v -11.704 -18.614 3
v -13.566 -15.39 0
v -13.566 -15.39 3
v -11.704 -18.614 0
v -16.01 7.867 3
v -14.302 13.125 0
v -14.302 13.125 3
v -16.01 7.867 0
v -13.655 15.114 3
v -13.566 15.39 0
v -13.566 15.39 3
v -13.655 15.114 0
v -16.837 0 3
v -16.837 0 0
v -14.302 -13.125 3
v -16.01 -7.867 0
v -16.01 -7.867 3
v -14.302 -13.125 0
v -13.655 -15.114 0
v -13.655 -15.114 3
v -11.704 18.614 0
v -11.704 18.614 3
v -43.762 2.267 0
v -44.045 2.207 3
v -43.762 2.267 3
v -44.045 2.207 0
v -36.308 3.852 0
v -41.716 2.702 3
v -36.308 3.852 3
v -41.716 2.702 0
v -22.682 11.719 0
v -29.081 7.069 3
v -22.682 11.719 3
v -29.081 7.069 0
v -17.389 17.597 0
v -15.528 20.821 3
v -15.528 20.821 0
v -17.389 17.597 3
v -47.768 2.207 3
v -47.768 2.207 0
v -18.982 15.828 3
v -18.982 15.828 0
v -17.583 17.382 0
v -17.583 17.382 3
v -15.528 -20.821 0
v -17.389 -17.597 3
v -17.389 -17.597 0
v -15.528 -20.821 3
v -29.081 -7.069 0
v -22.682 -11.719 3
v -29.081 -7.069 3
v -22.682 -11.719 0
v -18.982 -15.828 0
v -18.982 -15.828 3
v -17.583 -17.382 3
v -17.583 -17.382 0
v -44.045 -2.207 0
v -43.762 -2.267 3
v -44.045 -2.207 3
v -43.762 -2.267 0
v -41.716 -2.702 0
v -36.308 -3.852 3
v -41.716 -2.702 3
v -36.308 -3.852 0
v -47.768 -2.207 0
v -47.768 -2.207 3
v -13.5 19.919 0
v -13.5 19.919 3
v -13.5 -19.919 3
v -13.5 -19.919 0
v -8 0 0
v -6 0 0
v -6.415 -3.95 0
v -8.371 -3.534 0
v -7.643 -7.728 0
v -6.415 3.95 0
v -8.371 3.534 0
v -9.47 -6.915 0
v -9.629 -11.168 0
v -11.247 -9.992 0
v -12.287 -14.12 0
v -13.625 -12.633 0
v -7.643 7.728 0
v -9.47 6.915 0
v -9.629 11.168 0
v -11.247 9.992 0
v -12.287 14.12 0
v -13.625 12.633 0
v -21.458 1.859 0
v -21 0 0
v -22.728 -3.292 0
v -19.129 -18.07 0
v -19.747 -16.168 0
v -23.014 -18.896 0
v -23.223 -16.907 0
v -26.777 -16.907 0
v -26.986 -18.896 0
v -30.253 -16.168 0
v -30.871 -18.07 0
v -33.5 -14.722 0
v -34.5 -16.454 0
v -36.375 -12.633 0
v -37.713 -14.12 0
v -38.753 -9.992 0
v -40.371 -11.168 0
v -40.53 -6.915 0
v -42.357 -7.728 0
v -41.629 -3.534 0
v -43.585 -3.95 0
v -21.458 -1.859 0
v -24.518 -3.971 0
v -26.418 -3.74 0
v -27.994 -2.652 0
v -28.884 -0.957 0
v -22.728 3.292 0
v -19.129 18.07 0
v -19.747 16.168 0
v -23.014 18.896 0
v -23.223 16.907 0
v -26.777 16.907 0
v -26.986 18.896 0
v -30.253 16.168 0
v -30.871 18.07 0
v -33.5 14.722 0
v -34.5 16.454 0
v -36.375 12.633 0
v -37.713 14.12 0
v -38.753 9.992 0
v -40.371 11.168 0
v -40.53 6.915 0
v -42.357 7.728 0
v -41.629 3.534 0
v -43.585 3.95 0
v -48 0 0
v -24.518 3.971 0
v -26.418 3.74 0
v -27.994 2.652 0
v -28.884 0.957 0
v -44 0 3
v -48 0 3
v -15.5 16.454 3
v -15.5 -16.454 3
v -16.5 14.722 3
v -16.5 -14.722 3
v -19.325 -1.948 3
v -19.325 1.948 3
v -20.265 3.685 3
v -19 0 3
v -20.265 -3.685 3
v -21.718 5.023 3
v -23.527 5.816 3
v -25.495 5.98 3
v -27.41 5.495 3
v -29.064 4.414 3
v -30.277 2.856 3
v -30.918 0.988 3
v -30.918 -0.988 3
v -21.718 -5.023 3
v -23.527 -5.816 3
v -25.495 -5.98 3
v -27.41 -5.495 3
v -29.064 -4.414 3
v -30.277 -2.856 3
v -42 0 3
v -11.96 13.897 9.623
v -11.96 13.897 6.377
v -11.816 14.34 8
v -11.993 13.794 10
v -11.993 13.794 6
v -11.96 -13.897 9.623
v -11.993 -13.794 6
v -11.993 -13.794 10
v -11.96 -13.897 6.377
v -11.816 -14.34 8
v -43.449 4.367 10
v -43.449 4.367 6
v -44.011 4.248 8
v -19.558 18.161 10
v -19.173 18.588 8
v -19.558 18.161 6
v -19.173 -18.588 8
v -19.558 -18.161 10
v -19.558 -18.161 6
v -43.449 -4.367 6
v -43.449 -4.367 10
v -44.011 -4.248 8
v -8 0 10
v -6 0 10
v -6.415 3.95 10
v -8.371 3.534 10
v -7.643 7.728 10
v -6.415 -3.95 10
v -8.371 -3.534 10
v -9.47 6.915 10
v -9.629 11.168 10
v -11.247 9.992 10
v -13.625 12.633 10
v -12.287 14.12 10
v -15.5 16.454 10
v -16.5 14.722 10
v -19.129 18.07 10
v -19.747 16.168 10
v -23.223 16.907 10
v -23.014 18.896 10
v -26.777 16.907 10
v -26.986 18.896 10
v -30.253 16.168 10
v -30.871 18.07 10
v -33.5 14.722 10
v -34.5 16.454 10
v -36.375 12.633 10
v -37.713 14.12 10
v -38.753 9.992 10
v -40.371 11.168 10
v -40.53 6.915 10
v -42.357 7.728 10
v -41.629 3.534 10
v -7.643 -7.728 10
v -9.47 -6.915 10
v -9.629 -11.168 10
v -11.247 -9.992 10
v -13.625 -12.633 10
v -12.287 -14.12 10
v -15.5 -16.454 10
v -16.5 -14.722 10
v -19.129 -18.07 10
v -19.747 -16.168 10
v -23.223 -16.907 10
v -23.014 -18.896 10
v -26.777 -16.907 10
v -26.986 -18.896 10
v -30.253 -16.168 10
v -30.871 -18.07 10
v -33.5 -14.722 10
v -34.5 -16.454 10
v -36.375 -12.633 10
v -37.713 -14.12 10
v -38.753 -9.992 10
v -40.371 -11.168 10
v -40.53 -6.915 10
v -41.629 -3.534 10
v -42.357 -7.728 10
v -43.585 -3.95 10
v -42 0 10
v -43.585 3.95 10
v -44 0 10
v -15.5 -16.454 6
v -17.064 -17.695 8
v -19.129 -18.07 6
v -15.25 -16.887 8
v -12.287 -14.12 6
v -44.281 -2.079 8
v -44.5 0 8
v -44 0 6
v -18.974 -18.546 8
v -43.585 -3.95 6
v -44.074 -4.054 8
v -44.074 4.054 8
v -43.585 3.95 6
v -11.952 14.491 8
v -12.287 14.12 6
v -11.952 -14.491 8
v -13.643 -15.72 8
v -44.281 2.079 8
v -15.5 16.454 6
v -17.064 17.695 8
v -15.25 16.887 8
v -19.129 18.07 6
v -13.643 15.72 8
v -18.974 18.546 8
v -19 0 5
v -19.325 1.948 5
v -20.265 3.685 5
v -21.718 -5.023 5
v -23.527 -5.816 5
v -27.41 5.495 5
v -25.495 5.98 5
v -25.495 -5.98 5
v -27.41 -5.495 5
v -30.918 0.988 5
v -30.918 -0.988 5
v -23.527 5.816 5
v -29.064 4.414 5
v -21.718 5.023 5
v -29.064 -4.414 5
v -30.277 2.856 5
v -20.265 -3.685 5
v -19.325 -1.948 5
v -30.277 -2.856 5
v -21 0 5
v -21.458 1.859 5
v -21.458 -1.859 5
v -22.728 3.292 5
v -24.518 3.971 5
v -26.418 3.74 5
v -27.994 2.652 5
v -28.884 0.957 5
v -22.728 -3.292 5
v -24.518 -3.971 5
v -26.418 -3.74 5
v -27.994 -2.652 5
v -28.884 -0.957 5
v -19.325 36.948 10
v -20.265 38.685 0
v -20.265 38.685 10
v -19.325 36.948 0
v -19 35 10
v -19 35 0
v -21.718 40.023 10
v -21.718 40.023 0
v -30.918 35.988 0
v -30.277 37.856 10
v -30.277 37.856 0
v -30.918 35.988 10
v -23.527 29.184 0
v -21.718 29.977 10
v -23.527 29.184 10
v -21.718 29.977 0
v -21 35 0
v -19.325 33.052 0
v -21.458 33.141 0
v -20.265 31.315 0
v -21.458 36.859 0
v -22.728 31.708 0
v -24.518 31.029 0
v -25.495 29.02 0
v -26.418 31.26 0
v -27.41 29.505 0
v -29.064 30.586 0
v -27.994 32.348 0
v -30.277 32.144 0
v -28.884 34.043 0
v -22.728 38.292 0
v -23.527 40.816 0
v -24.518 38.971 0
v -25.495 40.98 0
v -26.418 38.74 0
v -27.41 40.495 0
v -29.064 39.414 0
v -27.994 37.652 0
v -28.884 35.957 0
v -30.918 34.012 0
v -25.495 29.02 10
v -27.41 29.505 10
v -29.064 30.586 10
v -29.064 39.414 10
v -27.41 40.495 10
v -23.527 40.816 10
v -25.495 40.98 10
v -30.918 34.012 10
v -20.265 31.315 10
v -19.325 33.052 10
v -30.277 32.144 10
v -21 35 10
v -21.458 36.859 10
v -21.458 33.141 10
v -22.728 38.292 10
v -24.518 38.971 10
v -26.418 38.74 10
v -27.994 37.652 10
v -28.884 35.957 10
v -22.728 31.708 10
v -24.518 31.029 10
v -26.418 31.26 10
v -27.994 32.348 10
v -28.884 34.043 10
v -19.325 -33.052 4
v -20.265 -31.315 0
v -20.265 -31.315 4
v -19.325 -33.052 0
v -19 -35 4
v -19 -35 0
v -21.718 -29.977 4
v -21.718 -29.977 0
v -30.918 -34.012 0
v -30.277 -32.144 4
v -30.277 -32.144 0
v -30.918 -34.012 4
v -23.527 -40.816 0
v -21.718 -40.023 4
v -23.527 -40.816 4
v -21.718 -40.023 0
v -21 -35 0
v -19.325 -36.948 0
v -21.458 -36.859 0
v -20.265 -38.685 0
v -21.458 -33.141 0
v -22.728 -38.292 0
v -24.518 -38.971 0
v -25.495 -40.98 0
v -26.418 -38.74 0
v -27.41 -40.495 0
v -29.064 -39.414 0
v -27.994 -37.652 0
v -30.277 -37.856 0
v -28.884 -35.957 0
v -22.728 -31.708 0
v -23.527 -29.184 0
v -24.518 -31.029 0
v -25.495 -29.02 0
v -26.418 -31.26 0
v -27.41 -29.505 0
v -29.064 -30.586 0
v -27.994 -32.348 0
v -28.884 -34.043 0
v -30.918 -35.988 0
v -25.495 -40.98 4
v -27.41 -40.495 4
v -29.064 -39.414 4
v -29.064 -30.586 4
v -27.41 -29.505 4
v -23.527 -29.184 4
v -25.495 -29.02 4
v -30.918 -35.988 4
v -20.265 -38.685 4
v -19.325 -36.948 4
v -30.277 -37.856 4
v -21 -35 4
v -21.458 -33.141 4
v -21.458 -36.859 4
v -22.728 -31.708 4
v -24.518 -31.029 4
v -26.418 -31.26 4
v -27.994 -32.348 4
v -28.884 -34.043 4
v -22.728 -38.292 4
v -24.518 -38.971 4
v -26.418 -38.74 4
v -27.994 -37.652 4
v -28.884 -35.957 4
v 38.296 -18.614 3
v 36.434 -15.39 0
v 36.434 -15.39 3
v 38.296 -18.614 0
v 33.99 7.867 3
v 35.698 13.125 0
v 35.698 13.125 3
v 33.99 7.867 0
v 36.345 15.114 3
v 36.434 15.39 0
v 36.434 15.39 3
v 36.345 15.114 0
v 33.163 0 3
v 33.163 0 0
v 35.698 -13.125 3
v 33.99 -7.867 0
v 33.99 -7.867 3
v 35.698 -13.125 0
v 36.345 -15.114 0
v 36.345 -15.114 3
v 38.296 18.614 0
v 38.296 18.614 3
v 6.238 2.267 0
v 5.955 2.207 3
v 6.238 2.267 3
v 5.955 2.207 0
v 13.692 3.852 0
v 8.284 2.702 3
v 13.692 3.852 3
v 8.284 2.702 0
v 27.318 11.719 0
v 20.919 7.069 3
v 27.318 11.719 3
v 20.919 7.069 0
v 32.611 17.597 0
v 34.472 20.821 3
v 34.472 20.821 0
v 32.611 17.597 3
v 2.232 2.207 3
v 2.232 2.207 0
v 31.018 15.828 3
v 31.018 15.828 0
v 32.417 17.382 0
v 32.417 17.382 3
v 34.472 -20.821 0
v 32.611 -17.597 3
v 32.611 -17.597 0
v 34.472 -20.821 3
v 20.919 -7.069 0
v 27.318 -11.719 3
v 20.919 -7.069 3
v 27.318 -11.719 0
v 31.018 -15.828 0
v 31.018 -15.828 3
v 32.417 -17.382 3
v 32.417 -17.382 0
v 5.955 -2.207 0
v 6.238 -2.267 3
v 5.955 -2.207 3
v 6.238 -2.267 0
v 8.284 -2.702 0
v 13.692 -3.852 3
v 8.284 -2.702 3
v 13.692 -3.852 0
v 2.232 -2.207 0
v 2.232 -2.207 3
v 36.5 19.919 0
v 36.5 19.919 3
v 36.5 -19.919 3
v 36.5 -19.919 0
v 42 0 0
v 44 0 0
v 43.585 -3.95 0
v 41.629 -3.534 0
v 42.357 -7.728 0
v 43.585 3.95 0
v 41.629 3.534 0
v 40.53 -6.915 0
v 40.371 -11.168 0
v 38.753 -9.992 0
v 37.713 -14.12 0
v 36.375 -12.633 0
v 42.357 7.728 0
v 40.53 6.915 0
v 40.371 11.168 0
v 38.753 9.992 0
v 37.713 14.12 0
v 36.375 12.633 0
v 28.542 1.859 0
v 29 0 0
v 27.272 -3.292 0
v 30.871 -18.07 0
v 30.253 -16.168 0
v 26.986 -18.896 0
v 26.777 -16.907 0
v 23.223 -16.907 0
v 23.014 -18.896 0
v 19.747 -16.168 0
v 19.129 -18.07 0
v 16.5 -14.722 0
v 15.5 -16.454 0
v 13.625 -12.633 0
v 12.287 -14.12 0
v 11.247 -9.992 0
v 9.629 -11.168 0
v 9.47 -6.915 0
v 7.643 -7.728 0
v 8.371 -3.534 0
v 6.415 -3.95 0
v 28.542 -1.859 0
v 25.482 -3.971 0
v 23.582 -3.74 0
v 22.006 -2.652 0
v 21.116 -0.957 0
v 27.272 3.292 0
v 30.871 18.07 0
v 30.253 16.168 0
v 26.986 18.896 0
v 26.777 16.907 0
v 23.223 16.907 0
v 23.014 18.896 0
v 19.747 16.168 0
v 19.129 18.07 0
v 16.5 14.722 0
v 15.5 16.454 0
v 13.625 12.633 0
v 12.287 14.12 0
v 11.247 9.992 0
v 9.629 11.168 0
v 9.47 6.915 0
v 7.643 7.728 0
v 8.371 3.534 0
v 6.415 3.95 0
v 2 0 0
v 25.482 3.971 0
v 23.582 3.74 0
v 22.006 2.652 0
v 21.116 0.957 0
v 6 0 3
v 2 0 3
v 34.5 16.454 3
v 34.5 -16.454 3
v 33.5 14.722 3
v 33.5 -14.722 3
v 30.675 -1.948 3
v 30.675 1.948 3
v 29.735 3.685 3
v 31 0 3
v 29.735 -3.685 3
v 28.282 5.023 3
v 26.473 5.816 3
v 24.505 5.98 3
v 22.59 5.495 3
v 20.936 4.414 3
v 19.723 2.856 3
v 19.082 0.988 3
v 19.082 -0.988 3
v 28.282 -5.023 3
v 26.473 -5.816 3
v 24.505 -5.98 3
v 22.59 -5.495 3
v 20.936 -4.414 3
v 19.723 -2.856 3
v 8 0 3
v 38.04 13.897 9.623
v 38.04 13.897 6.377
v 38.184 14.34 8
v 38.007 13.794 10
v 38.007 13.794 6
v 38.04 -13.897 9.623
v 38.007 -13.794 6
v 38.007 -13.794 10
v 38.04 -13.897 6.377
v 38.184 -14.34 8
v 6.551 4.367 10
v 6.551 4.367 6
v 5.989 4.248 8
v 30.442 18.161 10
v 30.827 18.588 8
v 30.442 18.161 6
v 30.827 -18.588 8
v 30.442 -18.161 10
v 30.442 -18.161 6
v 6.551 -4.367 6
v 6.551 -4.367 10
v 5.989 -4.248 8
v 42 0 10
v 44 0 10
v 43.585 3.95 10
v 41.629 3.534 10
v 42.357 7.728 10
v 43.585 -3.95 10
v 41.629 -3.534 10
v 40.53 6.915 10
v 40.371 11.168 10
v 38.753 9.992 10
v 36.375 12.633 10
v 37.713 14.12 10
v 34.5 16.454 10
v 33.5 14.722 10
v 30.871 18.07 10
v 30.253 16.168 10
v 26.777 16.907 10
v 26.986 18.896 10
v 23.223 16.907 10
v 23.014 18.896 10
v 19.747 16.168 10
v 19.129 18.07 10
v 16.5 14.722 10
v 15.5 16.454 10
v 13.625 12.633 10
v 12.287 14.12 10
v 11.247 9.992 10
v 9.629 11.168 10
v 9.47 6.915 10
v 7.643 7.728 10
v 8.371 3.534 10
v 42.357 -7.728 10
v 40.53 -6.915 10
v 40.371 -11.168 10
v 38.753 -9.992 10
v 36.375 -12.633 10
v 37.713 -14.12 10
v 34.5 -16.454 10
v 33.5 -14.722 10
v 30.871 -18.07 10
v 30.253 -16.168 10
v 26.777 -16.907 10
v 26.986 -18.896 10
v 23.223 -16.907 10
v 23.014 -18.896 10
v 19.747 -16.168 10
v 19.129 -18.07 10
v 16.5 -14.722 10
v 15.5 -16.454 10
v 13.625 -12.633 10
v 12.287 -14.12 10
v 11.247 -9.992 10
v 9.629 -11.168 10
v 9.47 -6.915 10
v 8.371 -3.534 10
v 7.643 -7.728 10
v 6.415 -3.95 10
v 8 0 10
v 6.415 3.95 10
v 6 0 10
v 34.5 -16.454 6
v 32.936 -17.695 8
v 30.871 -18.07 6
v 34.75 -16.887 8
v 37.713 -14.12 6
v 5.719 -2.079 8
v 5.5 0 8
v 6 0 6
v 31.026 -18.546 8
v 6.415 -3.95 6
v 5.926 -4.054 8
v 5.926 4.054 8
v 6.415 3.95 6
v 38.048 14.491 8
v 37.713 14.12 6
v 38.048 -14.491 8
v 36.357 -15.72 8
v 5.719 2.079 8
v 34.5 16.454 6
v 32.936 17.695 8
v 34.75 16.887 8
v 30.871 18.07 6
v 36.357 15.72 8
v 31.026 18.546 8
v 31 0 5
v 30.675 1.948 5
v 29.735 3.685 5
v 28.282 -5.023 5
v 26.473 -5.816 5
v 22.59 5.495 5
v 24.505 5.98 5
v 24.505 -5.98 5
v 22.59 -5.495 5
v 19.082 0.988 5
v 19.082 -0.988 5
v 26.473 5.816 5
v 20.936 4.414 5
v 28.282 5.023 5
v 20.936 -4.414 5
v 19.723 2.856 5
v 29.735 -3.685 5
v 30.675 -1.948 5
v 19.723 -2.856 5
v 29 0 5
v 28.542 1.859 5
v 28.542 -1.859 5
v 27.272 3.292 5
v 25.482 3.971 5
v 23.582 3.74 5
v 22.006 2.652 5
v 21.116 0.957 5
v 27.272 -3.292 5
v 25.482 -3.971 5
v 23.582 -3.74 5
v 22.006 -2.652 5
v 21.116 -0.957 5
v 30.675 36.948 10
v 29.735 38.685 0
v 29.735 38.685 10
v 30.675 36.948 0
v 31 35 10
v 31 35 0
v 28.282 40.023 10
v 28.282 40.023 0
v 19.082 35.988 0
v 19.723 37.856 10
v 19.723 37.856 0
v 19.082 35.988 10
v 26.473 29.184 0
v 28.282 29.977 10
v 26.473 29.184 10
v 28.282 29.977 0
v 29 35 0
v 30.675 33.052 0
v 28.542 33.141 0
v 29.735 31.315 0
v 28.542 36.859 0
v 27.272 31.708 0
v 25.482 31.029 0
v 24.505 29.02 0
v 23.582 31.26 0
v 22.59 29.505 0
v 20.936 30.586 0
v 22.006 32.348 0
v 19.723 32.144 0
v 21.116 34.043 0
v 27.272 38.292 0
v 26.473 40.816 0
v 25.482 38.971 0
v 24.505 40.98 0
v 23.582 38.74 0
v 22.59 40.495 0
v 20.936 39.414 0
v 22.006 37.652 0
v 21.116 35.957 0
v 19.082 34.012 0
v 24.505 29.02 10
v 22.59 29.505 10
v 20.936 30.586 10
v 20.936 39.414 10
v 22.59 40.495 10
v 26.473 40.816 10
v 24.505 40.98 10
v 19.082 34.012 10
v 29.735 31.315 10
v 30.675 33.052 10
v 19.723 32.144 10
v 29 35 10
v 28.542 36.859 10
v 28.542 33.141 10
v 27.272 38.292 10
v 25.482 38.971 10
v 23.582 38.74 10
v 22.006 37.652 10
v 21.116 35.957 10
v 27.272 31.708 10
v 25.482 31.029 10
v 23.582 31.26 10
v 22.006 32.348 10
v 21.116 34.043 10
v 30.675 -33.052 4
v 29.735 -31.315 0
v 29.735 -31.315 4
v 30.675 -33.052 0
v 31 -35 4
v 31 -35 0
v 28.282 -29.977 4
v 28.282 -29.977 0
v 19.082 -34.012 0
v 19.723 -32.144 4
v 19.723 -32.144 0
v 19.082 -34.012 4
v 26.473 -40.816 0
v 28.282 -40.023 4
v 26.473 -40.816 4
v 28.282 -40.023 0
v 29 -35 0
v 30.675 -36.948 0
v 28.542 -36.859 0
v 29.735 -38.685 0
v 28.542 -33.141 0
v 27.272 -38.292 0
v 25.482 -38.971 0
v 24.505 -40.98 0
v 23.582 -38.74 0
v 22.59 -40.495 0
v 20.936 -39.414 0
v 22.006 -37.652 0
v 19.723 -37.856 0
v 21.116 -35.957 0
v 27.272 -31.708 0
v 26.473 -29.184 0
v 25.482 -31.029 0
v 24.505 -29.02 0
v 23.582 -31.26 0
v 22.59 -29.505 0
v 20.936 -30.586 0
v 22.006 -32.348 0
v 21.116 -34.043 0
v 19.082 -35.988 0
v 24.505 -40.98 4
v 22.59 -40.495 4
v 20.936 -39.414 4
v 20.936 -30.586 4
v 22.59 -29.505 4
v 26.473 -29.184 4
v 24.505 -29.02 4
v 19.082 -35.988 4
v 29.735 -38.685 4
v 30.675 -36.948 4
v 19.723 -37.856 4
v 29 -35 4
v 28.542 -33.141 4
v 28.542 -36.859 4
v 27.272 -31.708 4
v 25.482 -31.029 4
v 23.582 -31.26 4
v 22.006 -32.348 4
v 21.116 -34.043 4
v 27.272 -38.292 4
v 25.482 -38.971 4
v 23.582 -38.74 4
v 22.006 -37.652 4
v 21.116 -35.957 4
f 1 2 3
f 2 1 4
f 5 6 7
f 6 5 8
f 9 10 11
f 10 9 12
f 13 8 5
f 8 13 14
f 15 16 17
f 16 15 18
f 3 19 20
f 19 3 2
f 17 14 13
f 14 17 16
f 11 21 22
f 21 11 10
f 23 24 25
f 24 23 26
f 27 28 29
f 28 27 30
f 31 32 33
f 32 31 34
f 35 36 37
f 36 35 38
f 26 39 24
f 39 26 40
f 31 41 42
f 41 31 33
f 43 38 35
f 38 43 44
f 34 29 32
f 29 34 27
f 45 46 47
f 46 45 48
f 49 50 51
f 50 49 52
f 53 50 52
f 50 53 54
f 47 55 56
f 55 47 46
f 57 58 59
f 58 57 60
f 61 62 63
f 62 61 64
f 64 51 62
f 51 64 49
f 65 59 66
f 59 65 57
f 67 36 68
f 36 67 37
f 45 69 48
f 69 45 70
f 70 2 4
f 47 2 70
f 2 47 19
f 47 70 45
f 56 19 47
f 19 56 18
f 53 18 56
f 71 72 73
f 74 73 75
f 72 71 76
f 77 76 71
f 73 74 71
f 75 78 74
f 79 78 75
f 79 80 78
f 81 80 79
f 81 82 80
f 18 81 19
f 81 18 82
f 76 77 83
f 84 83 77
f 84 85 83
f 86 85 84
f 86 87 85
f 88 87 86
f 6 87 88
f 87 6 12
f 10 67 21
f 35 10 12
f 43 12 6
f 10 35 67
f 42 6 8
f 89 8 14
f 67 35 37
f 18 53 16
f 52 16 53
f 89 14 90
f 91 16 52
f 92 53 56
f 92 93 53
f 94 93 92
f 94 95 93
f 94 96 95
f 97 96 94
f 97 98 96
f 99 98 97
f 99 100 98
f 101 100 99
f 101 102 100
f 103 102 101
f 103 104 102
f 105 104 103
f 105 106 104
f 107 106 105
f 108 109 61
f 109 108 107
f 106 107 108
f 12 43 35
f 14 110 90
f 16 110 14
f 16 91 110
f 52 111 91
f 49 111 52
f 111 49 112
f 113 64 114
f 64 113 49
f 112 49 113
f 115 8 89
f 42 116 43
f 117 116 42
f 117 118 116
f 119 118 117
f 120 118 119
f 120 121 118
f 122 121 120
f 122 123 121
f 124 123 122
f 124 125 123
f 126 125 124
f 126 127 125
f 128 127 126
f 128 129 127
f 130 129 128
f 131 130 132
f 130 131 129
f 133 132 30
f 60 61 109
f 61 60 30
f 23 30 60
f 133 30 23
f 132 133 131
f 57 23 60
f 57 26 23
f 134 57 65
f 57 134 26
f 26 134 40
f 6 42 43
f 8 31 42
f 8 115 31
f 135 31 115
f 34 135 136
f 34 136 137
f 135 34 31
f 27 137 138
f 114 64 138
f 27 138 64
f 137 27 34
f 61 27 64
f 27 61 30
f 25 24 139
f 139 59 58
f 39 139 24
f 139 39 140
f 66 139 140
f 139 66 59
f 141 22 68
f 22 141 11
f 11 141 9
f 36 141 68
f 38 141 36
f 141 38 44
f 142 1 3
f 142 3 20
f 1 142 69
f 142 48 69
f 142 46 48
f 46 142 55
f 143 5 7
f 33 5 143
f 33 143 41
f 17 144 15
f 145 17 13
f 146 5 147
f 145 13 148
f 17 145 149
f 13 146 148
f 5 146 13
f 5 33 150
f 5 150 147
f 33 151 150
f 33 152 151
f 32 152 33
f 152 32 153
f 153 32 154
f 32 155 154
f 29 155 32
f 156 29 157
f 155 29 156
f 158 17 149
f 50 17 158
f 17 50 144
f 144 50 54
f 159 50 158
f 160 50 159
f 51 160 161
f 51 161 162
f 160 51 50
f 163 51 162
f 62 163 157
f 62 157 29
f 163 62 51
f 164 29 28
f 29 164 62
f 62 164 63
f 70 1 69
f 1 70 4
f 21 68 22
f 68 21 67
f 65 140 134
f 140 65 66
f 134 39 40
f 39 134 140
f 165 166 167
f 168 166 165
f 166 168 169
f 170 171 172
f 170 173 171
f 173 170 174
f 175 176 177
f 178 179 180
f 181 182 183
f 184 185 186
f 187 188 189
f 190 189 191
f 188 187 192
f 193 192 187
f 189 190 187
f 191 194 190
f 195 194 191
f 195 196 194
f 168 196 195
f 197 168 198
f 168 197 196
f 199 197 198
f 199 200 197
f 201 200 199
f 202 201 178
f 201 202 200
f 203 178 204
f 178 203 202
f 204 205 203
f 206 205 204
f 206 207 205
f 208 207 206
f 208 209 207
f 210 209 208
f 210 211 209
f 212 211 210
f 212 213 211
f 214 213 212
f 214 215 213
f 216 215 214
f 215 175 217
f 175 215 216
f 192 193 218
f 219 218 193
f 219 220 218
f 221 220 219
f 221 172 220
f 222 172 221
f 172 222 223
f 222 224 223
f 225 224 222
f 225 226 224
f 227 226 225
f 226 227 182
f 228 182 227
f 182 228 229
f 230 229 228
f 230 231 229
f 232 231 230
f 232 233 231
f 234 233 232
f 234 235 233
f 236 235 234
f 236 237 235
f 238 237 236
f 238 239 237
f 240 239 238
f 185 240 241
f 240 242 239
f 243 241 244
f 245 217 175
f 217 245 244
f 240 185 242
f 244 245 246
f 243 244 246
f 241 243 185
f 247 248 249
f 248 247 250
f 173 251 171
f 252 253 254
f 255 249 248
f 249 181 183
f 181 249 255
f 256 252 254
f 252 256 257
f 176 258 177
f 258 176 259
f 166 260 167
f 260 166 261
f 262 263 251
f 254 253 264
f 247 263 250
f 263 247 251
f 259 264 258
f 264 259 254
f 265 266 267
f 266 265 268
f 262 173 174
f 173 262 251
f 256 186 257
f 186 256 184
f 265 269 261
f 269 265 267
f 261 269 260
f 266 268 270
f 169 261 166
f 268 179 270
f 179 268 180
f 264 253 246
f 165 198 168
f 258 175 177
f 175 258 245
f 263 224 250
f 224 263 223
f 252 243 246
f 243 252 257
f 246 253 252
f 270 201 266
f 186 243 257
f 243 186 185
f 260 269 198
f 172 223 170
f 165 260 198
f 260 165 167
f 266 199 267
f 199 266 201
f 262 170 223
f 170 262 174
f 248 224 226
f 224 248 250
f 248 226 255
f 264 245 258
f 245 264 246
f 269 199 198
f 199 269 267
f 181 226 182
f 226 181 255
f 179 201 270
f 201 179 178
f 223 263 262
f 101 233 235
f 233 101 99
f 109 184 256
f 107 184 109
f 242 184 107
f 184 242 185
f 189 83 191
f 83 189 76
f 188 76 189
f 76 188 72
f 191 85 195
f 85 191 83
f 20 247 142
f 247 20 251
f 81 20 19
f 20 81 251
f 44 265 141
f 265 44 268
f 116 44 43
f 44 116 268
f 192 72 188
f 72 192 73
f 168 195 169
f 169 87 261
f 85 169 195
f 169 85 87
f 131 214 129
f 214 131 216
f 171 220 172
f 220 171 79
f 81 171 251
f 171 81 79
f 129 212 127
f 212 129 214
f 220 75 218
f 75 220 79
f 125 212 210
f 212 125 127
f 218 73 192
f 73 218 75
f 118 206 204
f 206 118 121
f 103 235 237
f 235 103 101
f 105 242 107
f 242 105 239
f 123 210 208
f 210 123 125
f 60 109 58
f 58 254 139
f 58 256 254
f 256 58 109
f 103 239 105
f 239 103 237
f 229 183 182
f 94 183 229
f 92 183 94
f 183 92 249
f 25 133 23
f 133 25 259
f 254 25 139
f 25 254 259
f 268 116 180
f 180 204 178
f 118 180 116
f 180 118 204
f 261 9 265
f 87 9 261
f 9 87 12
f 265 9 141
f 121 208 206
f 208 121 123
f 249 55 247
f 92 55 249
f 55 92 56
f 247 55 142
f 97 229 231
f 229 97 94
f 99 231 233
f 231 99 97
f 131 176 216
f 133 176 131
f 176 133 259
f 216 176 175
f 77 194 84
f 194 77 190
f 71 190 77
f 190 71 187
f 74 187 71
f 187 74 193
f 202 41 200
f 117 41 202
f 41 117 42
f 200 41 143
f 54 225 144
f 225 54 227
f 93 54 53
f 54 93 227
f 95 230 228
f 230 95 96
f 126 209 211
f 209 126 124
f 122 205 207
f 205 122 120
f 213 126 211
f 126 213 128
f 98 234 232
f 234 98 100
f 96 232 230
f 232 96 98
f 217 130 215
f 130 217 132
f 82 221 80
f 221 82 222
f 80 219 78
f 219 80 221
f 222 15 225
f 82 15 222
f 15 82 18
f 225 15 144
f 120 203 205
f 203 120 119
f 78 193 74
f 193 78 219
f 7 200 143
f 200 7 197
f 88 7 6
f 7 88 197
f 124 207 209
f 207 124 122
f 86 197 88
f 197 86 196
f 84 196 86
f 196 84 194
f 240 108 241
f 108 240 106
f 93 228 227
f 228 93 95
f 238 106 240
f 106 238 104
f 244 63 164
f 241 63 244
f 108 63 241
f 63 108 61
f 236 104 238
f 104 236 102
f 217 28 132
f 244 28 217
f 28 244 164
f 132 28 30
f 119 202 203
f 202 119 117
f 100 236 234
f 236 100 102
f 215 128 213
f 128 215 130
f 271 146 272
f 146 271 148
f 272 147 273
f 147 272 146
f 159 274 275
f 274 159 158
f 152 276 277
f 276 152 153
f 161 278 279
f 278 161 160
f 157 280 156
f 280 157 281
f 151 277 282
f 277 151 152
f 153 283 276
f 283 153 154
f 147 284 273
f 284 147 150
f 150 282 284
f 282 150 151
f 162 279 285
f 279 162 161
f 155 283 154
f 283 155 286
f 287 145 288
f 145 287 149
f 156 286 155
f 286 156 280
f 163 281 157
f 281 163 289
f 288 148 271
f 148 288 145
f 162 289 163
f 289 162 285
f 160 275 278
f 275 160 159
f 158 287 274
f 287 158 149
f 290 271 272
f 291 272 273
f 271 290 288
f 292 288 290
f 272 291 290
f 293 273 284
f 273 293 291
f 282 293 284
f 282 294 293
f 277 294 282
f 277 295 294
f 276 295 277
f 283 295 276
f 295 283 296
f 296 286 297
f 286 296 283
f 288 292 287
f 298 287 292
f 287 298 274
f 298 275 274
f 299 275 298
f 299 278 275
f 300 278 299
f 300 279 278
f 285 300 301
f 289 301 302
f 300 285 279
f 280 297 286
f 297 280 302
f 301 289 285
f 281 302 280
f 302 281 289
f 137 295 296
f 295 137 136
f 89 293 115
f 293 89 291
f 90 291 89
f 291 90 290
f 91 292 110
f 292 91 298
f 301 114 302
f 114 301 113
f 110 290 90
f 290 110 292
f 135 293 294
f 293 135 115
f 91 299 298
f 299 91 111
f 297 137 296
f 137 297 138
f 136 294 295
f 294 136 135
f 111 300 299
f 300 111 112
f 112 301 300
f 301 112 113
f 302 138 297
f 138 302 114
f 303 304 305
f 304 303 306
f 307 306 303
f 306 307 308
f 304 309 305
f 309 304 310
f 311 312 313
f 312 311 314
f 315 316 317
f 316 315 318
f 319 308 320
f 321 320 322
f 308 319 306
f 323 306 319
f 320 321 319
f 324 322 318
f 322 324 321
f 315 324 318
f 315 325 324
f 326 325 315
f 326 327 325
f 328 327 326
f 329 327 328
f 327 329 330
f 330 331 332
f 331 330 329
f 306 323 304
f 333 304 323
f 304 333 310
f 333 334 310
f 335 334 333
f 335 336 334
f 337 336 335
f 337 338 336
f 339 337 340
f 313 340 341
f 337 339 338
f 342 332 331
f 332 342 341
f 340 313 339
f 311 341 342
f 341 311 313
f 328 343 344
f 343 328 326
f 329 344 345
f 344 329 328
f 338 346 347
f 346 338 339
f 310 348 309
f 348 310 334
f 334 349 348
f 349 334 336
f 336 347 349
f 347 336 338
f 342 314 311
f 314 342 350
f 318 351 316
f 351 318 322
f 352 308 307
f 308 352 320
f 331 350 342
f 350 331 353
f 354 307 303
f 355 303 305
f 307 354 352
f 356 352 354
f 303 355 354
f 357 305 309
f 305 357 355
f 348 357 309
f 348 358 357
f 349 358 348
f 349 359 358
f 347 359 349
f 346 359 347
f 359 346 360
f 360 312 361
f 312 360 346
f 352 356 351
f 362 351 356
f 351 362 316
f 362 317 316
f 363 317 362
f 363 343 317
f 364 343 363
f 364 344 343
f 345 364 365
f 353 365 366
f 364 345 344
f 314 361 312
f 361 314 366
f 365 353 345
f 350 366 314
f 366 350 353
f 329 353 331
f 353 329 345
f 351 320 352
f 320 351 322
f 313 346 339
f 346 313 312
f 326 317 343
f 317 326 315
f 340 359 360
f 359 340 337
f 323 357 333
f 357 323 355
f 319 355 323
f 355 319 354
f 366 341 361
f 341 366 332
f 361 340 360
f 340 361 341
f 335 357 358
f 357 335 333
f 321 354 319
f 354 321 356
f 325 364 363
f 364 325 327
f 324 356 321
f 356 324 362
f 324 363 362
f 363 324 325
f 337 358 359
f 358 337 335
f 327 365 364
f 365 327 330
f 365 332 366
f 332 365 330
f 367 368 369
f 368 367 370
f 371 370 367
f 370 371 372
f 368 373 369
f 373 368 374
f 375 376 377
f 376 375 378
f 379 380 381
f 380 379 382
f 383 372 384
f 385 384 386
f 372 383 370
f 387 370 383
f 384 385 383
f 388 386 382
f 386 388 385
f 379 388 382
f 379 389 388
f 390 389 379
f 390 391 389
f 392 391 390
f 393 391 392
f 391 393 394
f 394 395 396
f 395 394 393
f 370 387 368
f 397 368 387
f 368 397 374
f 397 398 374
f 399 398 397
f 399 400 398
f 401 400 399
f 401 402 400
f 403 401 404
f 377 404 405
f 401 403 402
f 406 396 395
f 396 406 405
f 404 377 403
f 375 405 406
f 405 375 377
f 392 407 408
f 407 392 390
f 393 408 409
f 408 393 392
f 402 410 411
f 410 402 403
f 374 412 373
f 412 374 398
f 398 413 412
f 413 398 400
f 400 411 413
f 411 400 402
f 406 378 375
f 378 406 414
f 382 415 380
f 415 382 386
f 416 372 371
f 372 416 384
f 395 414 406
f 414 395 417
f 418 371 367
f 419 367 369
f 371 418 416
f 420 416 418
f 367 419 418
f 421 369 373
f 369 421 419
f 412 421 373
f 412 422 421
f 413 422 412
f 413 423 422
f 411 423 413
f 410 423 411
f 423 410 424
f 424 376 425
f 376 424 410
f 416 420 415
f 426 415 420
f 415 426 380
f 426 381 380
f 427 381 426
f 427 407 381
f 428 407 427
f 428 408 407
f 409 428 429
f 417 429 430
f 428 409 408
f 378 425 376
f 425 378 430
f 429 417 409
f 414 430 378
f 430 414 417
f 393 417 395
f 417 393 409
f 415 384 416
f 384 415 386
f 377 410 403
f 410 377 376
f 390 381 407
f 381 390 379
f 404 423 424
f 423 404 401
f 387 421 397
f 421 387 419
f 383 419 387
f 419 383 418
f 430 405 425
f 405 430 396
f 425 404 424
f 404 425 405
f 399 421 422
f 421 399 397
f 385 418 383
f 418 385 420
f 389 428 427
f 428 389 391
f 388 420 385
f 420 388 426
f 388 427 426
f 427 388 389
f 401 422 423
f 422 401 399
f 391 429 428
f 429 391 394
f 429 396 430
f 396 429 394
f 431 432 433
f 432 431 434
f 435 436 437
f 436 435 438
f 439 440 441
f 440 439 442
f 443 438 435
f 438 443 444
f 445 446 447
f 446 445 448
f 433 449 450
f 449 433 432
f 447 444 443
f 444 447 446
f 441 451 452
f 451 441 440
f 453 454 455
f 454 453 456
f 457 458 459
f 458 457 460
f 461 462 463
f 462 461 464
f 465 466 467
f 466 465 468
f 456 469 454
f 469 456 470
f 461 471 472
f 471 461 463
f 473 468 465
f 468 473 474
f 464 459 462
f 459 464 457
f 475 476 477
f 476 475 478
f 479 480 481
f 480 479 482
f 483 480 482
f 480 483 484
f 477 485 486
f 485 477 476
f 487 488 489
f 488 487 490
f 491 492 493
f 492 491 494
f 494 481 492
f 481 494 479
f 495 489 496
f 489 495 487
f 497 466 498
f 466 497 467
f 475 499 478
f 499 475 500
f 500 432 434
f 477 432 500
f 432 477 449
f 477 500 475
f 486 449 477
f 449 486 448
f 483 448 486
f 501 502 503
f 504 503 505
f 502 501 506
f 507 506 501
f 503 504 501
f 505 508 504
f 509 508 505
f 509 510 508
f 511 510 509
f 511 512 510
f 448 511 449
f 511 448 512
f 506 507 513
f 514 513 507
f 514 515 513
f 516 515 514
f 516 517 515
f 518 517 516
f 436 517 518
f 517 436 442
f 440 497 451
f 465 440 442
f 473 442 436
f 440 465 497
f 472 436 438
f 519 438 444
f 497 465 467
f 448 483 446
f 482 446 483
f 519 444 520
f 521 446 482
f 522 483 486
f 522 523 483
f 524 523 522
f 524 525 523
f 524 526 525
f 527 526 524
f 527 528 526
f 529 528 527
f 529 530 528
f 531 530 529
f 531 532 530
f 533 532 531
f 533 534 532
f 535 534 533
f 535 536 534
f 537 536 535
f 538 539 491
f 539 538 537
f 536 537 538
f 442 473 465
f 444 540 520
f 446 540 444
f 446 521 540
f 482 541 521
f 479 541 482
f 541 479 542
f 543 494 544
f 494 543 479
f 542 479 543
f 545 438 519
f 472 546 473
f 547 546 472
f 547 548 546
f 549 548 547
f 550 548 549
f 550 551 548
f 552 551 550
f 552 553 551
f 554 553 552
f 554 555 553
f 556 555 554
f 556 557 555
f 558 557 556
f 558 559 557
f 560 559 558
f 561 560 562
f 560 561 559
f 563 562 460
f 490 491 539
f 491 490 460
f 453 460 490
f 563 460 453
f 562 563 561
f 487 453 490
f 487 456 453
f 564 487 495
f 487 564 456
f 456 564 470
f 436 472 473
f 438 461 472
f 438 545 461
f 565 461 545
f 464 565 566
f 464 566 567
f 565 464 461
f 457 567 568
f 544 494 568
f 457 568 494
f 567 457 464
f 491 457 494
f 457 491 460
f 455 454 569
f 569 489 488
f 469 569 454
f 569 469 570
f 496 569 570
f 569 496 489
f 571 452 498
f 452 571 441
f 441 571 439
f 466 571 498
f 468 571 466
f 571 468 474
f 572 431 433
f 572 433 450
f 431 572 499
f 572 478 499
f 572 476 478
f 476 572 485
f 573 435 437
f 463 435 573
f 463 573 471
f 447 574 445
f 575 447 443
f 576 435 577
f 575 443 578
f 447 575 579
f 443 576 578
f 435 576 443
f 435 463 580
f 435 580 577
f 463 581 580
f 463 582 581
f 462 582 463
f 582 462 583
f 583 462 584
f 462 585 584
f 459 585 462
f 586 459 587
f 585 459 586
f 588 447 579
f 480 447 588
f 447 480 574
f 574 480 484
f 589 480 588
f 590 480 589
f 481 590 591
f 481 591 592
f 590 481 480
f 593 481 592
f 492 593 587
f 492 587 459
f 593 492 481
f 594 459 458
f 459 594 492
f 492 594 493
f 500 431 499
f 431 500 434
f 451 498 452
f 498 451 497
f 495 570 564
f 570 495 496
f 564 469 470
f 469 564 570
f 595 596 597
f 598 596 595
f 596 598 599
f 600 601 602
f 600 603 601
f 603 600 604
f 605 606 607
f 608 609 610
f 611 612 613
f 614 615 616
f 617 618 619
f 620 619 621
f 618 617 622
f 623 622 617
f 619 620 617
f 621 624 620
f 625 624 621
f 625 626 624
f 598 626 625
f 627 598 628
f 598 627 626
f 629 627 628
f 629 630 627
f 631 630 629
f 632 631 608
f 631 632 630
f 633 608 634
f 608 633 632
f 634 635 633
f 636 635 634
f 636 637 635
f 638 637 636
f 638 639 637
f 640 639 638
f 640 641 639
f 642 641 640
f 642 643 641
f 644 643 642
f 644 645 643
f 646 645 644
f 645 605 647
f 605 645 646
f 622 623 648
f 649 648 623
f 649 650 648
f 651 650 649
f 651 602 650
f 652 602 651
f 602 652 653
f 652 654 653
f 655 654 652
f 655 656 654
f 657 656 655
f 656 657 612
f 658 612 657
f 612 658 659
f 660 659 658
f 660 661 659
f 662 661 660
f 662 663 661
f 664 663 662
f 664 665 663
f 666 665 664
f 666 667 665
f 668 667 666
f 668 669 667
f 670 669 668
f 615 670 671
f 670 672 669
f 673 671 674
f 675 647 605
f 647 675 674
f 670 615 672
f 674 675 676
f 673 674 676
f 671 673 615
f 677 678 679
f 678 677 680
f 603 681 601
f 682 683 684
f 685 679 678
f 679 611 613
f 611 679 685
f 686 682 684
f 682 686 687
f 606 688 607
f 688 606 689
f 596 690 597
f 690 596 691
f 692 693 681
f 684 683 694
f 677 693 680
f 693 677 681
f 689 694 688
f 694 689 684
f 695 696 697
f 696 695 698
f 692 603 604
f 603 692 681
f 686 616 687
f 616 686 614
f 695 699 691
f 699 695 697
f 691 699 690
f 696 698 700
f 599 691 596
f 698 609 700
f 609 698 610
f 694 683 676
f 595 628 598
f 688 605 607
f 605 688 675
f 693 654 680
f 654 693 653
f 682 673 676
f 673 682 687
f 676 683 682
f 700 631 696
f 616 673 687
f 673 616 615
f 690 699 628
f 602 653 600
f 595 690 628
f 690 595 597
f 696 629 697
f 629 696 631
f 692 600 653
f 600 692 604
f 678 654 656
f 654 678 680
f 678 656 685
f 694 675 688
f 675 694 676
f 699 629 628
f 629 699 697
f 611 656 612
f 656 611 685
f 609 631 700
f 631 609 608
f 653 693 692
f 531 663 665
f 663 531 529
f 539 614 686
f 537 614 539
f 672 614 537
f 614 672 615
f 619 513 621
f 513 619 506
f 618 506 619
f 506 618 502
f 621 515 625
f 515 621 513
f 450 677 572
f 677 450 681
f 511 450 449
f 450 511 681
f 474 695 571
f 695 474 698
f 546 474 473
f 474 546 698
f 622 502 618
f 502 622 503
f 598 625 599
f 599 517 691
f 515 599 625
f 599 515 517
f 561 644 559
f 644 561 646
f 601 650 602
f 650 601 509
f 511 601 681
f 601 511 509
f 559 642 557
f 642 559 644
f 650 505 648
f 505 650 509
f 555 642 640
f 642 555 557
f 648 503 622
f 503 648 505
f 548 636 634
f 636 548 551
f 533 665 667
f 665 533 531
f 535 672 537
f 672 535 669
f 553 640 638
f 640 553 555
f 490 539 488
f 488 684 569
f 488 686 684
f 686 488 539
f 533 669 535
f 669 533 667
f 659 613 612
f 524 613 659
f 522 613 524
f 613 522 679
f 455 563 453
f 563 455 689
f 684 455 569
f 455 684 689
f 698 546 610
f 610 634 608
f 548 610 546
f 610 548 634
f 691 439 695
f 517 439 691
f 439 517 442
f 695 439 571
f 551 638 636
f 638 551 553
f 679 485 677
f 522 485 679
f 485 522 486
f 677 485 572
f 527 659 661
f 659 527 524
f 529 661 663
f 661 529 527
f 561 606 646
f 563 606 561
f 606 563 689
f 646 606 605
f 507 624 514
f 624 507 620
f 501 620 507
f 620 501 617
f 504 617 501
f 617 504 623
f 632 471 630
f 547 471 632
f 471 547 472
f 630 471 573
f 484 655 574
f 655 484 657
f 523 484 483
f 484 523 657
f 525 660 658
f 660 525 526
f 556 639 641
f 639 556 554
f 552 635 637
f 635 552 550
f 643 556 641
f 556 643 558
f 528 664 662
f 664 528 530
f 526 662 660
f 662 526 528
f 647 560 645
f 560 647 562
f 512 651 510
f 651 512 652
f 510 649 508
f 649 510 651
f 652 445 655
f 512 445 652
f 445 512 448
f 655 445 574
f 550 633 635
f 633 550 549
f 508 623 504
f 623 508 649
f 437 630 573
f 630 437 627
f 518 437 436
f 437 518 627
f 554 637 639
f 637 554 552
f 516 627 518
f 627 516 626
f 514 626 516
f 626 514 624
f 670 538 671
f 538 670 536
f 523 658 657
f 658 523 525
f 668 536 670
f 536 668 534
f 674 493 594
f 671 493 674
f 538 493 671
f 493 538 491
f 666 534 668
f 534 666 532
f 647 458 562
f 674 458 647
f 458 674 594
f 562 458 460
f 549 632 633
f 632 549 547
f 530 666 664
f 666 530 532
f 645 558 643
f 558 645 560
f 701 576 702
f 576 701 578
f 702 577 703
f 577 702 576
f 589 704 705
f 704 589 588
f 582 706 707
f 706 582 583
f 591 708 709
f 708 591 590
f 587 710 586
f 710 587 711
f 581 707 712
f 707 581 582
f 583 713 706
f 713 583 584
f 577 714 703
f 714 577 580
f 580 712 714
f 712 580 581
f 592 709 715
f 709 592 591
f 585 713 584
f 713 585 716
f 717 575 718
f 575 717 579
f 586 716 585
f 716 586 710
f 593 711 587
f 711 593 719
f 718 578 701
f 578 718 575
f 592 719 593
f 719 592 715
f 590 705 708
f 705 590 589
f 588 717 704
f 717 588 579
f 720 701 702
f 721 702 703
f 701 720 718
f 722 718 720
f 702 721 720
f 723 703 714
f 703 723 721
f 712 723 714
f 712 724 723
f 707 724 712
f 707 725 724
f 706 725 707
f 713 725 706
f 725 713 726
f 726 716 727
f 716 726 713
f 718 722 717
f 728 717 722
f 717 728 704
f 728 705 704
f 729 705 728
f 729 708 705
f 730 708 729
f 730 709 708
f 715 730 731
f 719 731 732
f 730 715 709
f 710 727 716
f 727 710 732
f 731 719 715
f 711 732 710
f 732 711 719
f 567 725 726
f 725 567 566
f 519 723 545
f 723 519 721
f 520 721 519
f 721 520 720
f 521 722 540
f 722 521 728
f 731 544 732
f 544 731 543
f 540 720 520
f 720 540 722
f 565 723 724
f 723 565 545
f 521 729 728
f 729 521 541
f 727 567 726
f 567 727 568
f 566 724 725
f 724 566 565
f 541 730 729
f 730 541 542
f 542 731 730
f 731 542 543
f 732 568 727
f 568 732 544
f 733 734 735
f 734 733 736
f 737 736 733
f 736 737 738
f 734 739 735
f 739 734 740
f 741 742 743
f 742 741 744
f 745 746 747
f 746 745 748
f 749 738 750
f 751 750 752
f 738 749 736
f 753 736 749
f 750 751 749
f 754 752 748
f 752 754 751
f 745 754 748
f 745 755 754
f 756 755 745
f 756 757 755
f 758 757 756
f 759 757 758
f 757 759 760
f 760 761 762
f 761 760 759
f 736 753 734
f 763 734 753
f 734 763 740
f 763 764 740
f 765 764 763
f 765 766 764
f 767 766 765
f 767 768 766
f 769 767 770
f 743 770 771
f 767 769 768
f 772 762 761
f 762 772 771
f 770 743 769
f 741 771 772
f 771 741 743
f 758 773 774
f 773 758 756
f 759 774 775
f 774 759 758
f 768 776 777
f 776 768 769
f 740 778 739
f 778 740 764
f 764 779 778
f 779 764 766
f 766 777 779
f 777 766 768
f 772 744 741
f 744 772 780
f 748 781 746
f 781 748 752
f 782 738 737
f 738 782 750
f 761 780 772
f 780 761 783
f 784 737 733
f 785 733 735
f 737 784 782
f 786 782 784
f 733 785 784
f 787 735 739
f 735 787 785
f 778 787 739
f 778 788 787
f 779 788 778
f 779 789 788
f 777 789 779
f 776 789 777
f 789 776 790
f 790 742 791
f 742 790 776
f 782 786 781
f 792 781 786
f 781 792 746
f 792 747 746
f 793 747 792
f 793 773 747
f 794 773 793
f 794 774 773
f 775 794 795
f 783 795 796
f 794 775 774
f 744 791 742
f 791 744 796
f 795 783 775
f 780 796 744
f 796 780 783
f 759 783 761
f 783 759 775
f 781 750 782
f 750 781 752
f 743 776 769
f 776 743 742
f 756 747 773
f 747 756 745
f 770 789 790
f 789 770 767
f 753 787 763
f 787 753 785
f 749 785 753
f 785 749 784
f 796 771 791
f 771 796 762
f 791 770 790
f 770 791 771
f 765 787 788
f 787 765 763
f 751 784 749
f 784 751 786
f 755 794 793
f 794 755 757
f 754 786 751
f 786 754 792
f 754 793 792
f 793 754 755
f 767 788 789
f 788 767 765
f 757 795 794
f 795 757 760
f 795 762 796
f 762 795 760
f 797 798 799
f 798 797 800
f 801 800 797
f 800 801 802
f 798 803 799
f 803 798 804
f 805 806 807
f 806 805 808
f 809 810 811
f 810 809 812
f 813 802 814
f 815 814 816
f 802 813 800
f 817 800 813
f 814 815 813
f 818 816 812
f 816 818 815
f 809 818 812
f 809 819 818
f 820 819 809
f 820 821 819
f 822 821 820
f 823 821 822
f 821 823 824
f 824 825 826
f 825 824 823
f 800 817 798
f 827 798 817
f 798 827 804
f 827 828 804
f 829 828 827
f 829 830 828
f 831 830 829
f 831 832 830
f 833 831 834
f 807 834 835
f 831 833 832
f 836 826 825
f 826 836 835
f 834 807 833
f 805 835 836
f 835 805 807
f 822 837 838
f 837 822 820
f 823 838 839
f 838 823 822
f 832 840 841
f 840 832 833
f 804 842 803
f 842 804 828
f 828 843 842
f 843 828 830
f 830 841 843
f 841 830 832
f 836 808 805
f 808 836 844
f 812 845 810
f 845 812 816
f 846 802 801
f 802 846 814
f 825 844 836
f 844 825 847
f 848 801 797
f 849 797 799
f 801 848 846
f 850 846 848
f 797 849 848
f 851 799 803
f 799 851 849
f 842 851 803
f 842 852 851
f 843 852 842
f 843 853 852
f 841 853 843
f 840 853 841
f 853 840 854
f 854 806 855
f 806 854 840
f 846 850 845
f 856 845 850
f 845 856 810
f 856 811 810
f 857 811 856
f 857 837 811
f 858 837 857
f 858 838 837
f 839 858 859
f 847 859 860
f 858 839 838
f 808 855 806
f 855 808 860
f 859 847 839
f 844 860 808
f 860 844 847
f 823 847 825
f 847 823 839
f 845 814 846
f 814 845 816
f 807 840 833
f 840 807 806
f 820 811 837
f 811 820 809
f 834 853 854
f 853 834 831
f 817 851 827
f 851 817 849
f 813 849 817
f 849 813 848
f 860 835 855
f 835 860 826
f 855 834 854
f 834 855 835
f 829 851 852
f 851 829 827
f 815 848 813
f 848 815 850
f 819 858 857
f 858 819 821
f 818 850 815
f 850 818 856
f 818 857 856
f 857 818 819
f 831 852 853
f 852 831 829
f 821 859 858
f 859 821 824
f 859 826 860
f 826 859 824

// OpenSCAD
module tube(od, id, l)
{
    d = 1;
    difference()
    {
        cylinder(r=od/2, h=l);
        translate([0,0,-d]) cylinder(r=id/2, h=l+2*d);
    }
}

module threespokes(od, et, t)
{
    d = 1;
    difference()
    {
        cylinder(r=od/2, h=t);
        for (a=[0,120,240])
            translate([od*cos(a),od*sin(a),-d])
                cylinder(r=0.5*(sqrt(3)*od-et), h=t+d*2);
    }
}


module SpoolHolder(rd, rt, hd, ht, ad, at)
{
    d  = 1;
    t  = 2;
    bh = 0.5;  // height of retaining bump
    bt = 4;    // thickness of retaining bump
    b2 = bh*2;
    // Outer rim
    difference()
    {
        union()
        {
            threespokes(rd, 4, rt);
            difference()
            {
                union()
                {
                    cylinder(r=hd/2, h=ht);
                    translate([0,0,ht-bt]) 
                        intersection()
                        {
                            cylinder(r1=hd/2, r2=hd/2+b2, h=bt);
                            cylinder(r1=hd/2+b2, r2=hd/2, h=bt);
                            threespokes(rd, 8, bt);
                        }
                }
                translate([0,0,-d]) 
                    cylinder(r=(hd/2)-t, h=ht+d);
            }
            cylinder(r=(ad/2)+t, h=at);
        }
        translate([0,0,-d]) 
            cylinder(r=ad/2, h=at+2*d);    
    }
}

module SpoolSpacer(ad,l)
{
    tube(ad+4, ad, l);
}


for (x = [-25,25])
{
    translate([x,0,0])
    {
        SpoolHolder(38+8, 3, 38, 10, 8, 5);
        translate([0,35,0]) SpoolSpacer(8, 10) ;
        translate([0,-35,0]) SpoolSpacer(8, 4) ;
    }
}

// threespokes(20, 3, 5);
